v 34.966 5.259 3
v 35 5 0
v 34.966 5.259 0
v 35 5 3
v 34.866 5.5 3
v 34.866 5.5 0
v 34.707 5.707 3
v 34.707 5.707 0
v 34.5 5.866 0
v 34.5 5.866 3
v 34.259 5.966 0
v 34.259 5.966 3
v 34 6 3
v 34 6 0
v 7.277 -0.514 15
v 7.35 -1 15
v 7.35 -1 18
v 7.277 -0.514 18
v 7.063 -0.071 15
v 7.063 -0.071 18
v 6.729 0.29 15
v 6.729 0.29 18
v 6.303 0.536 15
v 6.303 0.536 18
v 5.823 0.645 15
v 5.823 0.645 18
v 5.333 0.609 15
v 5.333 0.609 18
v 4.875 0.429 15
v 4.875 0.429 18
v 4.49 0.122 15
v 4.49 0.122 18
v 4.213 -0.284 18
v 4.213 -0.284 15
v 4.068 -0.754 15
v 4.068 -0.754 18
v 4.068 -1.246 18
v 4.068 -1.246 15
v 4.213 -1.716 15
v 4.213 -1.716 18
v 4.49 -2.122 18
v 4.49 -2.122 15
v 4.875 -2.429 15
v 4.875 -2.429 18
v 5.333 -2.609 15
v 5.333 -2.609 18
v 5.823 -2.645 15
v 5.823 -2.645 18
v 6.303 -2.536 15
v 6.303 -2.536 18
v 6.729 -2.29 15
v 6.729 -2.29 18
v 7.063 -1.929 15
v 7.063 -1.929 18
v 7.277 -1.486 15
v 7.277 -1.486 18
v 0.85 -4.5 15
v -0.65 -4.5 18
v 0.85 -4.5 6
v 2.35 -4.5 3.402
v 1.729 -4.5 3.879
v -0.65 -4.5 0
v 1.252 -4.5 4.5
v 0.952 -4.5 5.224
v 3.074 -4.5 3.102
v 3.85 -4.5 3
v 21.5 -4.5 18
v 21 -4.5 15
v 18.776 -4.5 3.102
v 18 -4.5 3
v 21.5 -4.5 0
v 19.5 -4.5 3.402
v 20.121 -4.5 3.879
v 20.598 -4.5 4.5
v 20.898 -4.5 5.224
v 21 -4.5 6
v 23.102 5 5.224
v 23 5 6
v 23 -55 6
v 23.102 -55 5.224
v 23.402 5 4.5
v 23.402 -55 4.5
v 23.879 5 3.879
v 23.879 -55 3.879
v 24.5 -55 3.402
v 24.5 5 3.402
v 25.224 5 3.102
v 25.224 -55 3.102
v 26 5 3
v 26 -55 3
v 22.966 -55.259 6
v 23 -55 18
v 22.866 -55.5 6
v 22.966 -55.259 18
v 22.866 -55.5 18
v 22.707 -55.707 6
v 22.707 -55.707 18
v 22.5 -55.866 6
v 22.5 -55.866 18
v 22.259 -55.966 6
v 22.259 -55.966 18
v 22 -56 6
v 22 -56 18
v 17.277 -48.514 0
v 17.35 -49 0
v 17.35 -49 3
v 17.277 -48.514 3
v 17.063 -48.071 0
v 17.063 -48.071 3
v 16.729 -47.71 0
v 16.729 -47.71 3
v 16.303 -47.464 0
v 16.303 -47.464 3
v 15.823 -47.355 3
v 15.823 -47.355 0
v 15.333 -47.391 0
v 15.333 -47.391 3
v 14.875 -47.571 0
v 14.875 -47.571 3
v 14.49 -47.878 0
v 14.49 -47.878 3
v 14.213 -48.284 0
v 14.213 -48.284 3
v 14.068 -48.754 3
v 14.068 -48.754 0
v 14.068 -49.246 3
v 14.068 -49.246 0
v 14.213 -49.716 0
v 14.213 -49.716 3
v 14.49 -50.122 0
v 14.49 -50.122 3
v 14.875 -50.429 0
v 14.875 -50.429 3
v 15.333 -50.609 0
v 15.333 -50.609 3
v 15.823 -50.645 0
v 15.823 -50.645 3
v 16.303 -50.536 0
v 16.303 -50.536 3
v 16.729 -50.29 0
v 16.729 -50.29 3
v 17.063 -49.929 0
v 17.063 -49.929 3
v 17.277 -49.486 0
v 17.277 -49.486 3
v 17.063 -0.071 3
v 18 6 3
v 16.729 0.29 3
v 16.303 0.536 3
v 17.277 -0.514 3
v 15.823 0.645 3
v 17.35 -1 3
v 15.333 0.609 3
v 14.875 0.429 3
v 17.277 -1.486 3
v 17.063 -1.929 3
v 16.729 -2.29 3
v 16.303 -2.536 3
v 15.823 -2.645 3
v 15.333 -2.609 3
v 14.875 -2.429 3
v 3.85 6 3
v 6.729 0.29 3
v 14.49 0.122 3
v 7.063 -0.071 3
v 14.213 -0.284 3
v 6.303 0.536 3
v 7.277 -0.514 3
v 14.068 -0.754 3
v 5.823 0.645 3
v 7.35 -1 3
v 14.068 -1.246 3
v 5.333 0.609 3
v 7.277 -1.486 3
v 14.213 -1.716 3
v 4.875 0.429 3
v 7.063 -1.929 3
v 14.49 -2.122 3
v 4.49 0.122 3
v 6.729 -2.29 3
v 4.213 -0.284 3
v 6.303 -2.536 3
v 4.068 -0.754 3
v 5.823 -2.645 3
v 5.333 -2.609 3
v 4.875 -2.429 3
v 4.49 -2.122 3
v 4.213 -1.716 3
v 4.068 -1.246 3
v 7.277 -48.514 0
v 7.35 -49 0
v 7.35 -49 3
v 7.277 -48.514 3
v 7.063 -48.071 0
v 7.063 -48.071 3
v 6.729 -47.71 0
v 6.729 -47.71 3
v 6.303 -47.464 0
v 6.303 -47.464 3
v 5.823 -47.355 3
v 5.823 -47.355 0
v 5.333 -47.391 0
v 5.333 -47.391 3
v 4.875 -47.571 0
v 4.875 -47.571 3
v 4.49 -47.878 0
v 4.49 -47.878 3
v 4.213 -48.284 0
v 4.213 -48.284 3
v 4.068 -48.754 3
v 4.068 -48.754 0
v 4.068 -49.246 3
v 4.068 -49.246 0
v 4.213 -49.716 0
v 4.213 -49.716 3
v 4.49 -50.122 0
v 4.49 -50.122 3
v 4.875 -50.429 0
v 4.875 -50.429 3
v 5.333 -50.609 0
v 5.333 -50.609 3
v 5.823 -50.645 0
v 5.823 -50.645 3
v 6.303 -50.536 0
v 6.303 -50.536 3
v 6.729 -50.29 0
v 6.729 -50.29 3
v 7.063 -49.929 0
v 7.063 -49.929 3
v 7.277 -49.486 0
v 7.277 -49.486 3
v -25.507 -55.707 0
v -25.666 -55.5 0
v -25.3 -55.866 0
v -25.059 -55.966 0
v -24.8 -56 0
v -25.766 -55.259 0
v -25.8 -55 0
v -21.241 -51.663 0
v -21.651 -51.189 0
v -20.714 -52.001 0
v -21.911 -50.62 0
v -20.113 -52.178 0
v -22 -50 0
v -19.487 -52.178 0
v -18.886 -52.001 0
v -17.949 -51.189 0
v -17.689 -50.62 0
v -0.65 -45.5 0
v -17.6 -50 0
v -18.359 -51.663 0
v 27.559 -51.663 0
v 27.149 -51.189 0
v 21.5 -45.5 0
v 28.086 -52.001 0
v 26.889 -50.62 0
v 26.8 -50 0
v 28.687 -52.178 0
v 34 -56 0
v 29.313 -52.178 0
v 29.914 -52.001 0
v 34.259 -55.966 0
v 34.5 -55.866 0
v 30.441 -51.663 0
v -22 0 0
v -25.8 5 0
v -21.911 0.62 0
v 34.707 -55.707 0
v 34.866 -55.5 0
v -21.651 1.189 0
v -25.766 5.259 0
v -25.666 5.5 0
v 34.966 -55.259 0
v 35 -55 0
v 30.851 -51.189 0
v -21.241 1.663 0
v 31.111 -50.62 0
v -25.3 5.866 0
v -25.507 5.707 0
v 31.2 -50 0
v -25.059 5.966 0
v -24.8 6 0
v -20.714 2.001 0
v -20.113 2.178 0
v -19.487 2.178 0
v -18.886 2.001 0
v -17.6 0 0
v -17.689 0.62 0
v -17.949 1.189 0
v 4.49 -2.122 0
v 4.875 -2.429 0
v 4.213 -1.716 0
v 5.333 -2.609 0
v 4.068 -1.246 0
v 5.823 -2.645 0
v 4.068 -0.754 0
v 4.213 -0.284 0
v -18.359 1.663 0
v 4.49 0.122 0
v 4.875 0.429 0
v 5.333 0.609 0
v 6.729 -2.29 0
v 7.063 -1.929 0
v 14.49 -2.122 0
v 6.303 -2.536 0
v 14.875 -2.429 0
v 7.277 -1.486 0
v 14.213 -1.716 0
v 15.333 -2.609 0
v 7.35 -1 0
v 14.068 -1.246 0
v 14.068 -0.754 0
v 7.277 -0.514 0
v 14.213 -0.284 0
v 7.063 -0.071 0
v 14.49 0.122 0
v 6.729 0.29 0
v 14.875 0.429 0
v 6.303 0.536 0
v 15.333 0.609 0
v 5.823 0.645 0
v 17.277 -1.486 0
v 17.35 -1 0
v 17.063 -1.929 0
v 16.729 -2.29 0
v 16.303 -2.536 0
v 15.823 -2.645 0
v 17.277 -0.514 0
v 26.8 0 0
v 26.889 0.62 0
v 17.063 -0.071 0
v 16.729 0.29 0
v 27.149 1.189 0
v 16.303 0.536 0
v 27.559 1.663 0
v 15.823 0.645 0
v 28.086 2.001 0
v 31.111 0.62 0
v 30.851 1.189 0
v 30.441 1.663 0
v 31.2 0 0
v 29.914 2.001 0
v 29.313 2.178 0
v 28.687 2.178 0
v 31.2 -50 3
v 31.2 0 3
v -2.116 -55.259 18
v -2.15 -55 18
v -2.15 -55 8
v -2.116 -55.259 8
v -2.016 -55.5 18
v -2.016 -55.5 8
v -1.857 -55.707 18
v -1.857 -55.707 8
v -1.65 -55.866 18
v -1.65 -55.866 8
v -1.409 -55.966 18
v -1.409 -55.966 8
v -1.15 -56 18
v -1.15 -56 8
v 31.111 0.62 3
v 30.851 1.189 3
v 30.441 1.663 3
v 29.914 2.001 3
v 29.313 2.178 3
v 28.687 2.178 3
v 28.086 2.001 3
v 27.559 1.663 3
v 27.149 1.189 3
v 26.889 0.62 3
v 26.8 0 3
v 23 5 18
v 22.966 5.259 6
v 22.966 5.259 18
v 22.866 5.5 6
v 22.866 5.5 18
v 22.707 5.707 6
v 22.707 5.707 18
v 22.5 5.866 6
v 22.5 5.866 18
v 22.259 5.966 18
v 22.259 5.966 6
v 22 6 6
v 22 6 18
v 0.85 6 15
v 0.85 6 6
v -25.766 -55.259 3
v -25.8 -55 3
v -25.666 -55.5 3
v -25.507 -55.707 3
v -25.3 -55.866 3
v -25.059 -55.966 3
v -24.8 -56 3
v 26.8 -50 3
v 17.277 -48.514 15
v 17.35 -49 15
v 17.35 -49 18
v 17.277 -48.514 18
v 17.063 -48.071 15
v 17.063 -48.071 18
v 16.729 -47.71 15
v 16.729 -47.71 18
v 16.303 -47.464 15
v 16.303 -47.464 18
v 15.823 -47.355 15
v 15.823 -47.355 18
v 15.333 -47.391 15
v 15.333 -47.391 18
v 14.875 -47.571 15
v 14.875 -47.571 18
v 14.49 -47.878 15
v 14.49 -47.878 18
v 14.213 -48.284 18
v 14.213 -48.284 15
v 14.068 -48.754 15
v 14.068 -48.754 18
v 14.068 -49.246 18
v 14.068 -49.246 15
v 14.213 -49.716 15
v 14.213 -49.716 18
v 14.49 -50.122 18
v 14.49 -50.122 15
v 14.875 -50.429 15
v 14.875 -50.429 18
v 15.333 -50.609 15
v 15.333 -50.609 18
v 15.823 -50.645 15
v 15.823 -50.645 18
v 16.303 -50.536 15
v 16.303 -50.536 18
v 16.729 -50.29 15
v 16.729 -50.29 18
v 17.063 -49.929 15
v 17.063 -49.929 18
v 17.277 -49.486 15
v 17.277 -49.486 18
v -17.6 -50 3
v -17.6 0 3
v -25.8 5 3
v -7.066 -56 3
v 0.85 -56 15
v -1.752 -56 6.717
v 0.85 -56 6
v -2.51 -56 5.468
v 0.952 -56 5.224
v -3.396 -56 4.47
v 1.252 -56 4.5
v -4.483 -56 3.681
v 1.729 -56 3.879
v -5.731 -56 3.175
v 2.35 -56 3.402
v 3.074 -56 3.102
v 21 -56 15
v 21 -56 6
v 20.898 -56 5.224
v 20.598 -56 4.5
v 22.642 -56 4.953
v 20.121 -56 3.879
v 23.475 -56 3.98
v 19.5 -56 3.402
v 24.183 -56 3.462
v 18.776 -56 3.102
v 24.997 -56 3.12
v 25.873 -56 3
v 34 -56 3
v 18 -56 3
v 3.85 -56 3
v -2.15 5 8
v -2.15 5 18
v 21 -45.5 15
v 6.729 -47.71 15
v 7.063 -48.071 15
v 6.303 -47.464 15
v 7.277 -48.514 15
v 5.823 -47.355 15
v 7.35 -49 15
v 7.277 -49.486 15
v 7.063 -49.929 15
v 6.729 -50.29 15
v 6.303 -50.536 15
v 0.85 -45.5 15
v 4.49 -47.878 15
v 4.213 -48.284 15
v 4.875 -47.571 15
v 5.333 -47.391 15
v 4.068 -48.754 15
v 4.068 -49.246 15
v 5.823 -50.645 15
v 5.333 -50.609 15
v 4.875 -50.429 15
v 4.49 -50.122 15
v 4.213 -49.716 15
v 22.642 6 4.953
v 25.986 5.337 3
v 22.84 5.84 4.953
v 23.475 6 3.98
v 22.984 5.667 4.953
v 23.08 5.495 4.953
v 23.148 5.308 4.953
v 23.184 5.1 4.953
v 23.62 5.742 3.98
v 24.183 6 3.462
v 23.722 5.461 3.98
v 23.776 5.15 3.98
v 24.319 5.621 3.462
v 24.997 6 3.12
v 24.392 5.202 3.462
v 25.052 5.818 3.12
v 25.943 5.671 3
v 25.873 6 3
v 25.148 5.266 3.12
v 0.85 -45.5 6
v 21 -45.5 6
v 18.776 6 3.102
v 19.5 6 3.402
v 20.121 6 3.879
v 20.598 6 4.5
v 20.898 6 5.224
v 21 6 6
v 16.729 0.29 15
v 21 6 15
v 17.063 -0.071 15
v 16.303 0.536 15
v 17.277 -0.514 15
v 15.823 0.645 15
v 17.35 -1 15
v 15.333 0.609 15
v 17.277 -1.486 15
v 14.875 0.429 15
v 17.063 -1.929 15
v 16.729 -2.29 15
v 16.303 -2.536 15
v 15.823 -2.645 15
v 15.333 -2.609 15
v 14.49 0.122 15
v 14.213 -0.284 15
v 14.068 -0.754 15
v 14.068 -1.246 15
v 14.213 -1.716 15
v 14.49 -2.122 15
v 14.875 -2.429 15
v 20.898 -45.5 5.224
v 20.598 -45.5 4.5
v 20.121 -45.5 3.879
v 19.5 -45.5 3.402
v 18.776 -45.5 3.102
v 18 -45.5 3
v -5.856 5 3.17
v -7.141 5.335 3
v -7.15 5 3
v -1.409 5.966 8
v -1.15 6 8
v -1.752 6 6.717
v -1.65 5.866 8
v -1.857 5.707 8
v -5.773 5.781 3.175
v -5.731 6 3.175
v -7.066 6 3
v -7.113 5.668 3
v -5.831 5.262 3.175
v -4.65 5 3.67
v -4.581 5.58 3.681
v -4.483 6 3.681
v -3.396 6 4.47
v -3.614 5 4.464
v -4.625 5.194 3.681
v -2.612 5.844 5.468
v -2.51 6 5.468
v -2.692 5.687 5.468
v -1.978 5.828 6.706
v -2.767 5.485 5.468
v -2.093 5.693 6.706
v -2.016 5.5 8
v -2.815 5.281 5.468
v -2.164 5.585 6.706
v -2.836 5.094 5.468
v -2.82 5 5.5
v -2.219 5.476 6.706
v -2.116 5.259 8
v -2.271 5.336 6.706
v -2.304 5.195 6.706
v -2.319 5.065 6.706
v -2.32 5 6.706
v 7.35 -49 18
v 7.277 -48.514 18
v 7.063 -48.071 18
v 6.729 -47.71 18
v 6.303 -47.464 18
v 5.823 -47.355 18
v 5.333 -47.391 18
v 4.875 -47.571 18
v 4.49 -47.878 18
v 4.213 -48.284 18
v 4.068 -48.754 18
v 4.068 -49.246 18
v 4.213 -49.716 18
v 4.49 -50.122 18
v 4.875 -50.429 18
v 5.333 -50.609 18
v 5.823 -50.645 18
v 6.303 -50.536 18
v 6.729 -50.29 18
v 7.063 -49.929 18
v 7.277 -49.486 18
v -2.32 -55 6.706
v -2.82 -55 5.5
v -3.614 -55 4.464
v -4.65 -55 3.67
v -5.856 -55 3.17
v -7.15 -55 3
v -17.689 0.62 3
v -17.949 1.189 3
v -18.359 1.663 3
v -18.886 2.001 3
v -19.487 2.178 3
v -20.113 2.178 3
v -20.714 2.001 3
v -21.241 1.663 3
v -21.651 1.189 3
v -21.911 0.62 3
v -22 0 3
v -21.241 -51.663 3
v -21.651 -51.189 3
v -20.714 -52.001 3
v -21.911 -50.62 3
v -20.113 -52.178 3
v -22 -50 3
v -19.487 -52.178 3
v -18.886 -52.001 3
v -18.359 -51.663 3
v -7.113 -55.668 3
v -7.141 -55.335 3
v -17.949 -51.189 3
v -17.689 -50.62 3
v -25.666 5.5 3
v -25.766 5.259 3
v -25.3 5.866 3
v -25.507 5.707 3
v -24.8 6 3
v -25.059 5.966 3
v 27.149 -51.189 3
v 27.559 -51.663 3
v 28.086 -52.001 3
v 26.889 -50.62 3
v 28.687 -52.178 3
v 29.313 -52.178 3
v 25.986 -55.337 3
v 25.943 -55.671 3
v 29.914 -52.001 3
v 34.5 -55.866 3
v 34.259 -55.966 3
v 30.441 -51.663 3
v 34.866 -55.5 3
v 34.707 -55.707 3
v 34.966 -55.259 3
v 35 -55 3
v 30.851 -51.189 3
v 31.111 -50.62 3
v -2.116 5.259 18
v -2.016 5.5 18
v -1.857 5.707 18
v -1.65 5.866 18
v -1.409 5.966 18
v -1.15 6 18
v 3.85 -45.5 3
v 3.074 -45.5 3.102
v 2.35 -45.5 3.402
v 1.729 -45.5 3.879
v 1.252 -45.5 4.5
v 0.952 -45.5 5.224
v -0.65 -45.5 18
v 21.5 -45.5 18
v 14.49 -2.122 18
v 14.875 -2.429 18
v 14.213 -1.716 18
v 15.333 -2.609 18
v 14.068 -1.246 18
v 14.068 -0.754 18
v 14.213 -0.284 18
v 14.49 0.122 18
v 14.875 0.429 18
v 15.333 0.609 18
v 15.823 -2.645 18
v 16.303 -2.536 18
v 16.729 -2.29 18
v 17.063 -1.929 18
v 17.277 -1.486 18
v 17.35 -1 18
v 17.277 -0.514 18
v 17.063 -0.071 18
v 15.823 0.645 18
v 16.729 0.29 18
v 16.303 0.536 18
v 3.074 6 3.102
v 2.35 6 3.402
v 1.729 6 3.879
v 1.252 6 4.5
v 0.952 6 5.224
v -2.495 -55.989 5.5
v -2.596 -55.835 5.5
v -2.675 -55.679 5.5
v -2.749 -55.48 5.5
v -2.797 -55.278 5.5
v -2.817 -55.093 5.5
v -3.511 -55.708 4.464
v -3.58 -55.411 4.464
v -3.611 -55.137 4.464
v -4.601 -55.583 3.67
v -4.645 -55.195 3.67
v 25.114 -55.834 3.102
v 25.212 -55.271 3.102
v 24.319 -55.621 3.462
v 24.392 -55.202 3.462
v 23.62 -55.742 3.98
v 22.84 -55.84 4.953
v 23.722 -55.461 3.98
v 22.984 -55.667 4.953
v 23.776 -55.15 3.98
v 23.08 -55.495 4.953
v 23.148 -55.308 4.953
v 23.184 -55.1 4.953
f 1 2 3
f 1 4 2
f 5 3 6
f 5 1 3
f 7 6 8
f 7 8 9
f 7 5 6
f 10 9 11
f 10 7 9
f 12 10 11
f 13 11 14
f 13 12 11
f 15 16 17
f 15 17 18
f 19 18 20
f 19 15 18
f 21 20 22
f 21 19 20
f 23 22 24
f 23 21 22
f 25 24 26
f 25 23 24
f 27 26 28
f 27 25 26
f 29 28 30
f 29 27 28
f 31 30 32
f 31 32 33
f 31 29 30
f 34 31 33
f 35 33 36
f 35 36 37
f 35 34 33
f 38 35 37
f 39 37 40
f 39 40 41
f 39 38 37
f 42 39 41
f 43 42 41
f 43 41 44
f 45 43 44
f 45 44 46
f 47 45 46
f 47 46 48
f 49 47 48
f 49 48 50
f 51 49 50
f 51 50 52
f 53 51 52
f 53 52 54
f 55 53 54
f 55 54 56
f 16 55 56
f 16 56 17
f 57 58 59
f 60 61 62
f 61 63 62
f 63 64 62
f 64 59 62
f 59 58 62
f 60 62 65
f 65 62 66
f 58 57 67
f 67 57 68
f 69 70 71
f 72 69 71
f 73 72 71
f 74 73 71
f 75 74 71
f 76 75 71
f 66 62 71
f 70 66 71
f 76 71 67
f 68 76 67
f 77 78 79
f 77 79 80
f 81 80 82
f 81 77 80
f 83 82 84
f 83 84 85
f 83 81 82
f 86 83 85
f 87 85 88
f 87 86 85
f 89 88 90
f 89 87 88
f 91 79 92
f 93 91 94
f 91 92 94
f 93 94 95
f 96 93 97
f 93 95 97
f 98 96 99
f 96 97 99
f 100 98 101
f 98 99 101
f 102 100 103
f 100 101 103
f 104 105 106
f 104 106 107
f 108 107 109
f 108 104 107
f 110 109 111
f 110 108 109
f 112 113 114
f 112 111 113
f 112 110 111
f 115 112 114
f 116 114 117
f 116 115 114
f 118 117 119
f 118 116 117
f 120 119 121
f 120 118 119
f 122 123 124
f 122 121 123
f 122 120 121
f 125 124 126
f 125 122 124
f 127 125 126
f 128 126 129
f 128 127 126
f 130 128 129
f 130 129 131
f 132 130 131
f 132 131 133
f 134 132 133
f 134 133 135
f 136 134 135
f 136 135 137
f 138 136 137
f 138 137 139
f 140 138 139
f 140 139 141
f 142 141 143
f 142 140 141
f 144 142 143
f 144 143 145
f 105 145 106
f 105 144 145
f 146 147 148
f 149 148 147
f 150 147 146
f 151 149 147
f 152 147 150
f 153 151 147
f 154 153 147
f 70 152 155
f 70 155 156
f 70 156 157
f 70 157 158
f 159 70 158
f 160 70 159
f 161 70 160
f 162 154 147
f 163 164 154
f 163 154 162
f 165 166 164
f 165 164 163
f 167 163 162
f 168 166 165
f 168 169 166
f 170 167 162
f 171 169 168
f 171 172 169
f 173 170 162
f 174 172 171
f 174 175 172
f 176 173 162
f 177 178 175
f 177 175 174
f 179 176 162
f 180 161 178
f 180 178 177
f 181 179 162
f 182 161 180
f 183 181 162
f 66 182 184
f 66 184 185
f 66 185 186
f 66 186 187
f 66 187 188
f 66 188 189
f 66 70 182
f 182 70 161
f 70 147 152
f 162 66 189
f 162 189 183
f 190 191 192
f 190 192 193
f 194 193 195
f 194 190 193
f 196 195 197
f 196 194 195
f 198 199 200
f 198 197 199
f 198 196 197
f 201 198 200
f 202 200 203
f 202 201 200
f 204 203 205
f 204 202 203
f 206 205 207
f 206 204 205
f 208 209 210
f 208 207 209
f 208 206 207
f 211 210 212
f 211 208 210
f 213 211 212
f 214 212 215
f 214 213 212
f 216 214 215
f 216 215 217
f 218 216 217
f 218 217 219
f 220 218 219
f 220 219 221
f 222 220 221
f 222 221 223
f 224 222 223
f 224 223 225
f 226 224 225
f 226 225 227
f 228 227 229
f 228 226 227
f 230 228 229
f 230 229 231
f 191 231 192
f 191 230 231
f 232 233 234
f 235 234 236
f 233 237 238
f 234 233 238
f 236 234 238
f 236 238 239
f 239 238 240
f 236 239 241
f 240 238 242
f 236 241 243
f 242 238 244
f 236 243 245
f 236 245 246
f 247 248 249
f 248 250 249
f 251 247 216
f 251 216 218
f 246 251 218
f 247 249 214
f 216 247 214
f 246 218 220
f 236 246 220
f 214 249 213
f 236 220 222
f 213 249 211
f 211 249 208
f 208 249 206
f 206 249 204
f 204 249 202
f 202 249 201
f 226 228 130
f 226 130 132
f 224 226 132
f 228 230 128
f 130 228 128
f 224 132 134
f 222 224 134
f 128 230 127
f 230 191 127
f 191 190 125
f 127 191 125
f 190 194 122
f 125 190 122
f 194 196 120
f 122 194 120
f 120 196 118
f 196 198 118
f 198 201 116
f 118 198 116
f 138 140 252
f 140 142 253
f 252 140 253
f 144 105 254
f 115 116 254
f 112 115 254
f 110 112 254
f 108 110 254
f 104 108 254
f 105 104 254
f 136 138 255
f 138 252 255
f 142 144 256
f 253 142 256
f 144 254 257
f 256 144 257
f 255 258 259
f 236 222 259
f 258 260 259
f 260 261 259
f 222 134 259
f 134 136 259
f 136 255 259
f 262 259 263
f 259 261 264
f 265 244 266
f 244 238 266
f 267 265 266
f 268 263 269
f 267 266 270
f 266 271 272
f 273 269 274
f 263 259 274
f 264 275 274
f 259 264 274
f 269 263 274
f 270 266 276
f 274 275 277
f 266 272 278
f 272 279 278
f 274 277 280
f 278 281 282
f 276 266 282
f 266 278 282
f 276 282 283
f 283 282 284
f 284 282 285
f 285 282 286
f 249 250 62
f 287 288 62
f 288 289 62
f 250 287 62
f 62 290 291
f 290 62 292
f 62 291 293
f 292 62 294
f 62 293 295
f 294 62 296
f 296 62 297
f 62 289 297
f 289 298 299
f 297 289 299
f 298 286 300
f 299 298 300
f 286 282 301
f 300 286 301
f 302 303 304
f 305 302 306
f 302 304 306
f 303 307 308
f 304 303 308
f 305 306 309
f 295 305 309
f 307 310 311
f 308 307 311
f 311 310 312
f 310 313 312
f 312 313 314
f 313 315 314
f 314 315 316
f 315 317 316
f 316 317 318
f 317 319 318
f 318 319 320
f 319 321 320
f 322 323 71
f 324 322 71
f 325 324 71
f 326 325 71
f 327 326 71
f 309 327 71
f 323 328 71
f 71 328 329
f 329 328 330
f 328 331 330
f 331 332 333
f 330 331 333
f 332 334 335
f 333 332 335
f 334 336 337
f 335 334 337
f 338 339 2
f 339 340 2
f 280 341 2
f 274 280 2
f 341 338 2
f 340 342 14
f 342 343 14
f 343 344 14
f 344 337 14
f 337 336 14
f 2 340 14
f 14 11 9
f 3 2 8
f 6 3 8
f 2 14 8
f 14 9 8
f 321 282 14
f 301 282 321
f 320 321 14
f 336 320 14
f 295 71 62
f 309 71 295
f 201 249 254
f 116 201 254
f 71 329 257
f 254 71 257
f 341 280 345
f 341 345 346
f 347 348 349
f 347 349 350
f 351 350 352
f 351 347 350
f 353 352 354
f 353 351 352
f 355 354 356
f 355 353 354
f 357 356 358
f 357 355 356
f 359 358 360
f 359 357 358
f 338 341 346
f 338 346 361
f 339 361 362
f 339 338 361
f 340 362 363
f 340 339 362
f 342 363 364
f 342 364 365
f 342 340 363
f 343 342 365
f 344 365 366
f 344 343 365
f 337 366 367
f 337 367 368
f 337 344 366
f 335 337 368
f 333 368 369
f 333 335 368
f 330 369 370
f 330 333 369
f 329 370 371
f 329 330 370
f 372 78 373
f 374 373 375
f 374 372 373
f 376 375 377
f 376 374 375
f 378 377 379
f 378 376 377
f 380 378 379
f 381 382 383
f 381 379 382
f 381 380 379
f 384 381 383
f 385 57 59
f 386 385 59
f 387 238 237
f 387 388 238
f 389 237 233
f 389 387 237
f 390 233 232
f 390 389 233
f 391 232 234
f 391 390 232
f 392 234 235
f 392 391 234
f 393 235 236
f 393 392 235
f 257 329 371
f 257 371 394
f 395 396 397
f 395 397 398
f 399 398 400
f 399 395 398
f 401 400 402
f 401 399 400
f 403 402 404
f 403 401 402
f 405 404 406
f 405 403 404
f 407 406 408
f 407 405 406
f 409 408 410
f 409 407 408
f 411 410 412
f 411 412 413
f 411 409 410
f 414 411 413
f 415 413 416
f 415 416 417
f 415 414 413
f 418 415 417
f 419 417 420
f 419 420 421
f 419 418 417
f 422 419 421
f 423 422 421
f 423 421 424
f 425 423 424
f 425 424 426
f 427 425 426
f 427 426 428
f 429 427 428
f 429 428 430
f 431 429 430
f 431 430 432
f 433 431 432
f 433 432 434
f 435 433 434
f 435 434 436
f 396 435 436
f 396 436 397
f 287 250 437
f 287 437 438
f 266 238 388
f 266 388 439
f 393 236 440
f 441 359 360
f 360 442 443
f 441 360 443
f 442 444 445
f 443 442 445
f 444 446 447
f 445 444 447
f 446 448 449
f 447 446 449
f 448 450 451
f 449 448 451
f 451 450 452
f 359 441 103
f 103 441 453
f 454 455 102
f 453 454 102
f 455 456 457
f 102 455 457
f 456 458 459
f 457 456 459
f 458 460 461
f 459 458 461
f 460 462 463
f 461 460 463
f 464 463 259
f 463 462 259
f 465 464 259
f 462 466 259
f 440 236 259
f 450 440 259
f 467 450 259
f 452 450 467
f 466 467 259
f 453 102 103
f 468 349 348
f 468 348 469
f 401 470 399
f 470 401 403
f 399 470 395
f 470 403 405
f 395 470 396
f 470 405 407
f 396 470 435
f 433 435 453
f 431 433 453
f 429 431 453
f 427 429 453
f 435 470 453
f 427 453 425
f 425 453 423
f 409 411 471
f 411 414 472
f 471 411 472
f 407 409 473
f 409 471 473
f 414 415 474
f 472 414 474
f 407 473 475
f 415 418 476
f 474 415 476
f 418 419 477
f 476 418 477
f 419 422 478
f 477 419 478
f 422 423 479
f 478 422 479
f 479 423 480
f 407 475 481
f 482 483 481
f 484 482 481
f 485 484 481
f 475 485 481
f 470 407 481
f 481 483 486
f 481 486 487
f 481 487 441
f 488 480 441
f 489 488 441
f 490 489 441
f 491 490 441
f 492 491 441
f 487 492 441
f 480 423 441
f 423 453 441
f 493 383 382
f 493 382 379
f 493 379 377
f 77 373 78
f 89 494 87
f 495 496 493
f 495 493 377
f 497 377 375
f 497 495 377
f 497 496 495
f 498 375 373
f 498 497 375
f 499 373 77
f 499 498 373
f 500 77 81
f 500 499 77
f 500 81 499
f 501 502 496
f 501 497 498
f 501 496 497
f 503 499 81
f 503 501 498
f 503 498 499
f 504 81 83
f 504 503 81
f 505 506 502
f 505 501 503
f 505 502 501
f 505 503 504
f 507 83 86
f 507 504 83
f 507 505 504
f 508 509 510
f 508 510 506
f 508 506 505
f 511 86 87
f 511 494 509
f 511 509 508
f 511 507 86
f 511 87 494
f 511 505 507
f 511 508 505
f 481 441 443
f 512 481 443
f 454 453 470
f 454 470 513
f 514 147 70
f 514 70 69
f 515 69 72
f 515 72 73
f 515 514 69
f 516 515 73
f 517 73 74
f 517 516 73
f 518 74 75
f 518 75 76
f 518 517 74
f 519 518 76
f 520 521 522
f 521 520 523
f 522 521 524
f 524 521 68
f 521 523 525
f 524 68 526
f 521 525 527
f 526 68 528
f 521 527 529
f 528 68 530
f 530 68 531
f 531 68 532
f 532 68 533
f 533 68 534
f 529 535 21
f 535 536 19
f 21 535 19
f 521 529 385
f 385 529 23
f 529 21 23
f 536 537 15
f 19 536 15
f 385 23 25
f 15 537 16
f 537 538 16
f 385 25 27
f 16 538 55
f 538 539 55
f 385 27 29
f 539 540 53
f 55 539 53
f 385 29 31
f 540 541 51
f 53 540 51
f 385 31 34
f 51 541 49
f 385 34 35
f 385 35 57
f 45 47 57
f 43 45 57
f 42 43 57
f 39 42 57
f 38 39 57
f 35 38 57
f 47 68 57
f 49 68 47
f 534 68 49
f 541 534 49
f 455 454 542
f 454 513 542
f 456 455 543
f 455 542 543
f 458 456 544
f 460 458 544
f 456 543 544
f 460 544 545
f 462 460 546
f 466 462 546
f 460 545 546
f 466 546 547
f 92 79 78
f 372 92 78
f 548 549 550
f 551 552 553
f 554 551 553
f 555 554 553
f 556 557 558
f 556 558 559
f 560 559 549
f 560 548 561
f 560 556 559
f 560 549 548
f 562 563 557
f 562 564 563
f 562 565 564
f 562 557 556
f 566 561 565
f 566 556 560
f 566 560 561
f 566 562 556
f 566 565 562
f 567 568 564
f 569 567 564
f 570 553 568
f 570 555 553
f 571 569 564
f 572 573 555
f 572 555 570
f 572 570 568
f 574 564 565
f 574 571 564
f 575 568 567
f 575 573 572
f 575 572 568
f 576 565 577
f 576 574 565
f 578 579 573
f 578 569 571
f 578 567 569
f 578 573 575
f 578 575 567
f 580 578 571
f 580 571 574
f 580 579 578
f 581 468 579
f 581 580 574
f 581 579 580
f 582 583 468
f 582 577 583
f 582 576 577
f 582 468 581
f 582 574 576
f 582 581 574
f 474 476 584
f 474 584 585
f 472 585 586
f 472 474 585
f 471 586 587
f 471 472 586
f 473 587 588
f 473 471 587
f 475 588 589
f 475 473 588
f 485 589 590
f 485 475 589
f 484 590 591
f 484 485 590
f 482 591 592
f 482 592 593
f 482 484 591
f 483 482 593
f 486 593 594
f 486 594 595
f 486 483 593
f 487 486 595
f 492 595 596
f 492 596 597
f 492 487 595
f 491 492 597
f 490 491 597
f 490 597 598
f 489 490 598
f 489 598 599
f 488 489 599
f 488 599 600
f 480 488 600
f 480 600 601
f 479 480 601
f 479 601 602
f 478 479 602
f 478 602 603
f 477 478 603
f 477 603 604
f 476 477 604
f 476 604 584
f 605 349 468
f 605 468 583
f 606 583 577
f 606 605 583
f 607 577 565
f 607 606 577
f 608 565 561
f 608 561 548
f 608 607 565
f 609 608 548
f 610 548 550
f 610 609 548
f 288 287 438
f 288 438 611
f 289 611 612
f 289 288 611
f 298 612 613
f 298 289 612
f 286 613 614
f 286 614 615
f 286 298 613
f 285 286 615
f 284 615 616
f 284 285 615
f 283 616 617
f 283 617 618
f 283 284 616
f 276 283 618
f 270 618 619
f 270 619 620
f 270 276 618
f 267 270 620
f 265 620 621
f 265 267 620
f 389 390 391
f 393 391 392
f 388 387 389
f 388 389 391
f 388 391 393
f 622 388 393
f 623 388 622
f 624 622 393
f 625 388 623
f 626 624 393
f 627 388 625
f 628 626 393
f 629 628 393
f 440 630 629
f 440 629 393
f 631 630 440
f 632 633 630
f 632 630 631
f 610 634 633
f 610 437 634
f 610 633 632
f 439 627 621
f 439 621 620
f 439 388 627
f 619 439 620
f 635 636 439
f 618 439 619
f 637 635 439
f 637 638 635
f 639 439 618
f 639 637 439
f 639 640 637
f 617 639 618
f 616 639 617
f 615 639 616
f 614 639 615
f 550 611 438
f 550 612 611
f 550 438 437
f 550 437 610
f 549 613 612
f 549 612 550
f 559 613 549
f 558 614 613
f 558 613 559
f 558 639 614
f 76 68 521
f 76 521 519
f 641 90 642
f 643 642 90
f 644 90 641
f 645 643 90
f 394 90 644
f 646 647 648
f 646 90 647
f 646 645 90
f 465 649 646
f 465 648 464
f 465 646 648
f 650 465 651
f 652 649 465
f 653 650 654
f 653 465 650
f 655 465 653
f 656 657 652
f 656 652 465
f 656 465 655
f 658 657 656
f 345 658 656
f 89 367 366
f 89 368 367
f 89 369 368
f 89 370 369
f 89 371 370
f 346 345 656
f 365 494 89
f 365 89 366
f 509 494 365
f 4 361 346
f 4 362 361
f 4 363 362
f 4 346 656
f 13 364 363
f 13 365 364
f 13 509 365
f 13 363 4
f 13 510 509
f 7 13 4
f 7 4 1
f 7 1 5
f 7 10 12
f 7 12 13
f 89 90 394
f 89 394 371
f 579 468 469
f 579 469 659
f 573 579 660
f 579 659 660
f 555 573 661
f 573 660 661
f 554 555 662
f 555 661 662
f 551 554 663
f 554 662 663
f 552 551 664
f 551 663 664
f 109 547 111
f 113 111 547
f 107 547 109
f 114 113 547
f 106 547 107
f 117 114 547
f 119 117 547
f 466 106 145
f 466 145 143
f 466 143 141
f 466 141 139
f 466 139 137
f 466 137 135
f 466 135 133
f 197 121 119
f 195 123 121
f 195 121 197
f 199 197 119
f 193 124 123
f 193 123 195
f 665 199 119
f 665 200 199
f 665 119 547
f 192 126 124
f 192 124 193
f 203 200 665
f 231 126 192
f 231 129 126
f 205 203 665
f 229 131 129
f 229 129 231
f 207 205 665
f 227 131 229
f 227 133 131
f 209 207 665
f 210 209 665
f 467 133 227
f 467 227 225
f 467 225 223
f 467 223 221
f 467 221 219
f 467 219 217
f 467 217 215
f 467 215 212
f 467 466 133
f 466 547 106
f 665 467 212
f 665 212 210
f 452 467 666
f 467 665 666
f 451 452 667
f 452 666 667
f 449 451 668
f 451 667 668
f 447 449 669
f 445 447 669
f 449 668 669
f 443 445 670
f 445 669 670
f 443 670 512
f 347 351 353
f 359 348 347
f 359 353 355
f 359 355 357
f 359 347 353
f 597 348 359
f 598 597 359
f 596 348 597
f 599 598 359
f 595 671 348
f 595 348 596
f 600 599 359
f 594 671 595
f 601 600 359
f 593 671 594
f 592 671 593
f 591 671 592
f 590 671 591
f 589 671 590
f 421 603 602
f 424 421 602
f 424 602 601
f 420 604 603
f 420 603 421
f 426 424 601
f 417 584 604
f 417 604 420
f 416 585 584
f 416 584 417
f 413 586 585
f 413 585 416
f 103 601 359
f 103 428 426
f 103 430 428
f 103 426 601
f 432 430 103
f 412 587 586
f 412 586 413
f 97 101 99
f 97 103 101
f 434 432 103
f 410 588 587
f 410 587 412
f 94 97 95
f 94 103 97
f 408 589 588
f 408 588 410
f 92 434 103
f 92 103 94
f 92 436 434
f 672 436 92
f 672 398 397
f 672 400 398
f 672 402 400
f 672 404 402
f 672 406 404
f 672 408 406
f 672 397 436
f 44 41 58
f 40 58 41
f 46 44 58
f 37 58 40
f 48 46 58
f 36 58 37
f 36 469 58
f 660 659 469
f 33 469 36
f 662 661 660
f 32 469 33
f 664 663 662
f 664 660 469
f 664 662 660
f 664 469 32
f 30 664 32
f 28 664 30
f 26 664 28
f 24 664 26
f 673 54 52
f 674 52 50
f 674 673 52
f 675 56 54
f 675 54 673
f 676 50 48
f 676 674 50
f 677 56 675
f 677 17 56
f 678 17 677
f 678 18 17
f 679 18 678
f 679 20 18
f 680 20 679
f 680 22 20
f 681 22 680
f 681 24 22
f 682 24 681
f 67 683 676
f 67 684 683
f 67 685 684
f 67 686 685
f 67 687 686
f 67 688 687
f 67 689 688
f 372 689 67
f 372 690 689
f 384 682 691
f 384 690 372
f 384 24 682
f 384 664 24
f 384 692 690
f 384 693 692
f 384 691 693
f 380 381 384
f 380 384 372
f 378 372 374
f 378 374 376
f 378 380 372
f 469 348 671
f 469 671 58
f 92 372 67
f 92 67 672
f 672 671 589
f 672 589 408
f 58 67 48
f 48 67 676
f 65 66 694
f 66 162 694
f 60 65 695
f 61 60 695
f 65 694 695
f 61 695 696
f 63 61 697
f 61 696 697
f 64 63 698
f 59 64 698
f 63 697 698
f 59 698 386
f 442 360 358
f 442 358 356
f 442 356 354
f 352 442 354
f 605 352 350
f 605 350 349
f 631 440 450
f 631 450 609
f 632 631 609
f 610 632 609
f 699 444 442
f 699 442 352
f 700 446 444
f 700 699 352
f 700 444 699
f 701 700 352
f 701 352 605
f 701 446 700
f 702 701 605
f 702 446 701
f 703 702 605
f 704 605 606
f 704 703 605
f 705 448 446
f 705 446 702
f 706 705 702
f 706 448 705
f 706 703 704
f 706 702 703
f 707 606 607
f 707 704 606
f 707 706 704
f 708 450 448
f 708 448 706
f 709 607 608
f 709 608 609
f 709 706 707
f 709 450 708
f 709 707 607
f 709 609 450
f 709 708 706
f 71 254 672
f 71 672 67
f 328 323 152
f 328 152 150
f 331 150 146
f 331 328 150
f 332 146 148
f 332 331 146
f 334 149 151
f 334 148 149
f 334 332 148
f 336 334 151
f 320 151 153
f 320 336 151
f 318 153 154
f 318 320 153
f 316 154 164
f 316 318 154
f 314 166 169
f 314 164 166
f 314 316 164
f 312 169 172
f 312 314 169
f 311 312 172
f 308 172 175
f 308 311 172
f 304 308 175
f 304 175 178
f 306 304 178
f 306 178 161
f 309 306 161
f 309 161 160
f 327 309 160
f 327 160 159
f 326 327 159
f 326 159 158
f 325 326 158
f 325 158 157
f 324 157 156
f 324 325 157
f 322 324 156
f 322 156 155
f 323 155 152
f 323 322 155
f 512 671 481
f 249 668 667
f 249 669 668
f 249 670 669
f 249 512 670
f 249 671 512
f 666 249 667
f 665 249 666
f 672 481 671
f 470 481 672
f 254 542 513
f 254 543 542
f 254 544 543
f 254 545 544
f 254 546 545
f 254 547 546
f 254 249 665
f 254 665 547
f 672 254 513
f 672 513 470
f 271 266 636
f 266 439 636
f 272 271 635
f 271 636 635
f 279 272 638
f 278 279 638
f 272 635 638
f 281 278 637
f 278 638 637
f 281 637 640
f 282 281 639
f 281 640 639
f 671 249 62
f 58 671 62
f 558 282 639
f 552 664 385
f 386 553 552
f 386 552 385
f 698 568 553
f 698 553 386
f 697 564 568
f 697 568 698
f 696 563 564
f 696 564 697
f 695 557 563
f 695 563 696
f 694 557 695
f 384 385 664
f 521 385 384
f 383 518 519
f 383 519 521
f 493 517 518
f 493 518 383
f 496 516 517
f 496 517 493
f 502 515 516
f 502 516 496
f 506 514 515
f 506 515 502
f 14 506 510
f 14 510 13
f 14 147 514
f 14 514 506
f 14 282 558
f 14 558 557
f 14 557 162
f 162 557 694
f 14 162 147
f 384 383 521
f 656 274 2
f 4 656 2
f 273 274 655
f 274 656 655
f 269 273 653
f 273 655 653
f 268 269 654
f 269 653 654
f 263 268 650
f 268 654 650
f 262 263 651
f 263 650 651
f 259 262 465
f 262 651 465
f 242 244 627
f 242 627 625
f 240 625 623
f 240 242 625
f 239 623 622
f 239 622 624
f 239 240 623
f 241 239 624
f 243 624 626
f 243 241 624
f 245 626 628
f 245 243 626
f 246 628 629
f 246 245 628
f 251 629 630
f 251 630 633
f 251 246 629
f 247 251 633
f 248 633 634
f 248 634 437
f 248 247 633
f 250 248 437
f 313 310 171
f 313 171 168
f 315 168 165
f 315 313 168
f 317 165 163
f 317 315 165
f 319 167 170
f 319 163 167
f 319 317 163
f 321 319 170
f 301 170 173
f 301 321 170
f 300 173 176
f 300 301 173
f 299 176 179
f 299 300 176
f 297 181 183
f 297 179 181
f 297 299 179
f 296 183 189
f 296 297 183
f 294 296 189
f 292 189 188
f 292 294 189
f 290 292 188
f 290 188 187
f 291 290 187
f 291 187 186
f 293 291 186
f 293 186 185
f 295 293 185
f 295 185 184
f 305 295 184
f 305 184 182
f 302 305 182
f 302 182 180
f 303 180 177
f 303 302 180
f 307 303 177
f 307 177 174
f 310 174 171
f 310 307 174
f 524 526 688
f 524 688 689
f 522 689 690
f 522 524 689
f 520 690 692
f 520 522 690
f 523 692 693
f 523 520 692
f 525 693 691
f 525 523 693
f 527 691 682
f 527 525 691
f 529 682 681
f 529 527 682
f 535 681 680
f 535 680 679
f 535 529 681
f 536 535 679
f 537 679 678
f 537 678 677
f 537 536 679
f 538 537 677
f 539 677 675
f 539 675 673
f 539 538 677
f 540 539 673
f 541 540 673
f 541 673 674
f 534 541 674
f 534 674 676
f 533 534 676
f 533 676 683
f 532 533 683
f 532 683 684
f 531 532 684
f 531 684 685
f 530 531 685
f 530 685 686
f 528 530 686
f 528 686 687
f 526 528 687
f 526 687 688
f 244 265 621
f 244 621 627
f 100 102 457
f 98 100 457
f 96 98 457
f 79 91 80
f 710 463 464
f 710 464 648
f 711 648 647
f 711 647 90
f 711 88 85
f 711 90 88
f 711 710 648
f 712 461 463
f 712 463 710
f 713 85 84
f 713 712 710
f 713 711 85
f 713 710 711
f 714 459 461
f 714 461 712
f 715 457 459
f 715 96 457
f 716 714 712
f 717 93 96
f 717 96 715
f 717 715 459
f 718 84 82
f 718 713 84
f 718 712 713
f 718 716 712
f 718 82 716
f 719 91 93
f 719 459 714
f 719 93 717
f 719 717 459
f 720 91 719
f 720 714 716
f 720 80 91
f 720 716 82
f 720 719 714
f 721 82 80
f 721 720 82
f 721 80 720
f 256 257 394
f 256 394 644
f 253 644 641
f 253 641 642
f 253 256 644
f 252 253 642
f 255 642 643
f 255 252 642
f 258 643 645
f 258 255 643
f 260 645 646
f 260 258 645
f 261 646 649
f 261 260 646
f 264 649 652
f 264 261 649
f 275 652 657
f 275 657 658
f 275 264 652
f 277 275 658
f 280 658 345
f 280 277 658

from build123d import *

# Parameters (mm, degrees)
SKETCH_1_W          = 60.8
SKETCH_1_H          = 62
EXTRUDE_1_DEPTH     = 3
SKETCH_2_W          = 25.15
SKETCH_2_H          = 62
SKETCH_2_R          = 1.65
EXTRUDE_2_DEPTH     = 15
CUT_EXTRUDE_START   = -45
SKETCH_4_R          = 1.65
SKETCH_4_W          = 22.15
SKETCH_4_H          = 41
CUT_EXTRUDE_4_DEPTH = 45
FILLET_1_R          = 1
FILLET_2_R          = 5
SKETCH_5_W          = 20.15
SKETCH_5_H          = 12
CUT_EXTRUDE_5_DEPTH = 70
FILLET_3_R          = 3
FILLET_4_R          = 3


with BuildPart() as part:
    # 草图1 → 凸台-拉伸1 (new body)
    with BuildSketch(Plane.XY):
        with Locations((4.6, -25)):
            Rectangle(SKETCH_1_W, SKETCH_1_H)
        with BuildLine():
            Line((26.8, 0), (26.8, -50))
            ThreePointArc((26.8, -50), (29, -52.2), (31.2, -50))
            Line((31.2, -50), (31.2, 0))
            ThreePointArc((31.2, 0), (29, 2.2), (26.8, 0))
        make_face(mode=Mode.SUBTRACT)
        with BuildLine():
            Line((-22, 0), (-22, -50))
            ThreePointArc((-22, -50), (-19.8, -52.2), (-17.6, -50))
            Line((-17.6, -50), (-17.6, 0))
            ThreePointArc((-17.6, 0), (-19.8, 2.2), (-22, 0))
        make_face(mode=Mode.SUBTRACT)
    extrude(amount=EXTRUDE_1_DEPTH)

    # 草图2 → 凸台-拉伸2 (add)
    with BuildSketch(Plane.XY.offset(3)):
        with Locations((10.425, -25)):
            Rectangle(SKETCH_2_W, SKETCH_2_H)
        with Locations((5.7, -1)):
            Circle(SKETCH_2_R, mode=Mode.SUBTRACT)
        with Locations((15.7, -1)):
            Circle(SKETCH_2_R, mode=Mode.SUBTRACT)
        with Locations((15.7, -49)):
            Circle(SKETCH_2_R, mode=Mode.SUBTRACT)
        with Locations((5.7, -49)):
            Circle(SKETCH_2_R, mode=Mode.SUBTRACT)
    extrude(amount=EXTRUDE_2_DEPTH)

    # 草图4 → 切除-拉伸4 (cut)
    with BuildSketch(Plane.XY.offset(18).offset(CUT_EXTRUDE_START)):
        with Locations((5.7, -1)):
            Circle(SKETCH_4_R)
        with Locations((5.7, -49)):
            Circle(SKETCH_4_R)
        with Locations((15.7, -49)):
            Circle(SKETCH_4_R)
        with Locations((15.7, -1)):
            Circle(SKETCH_4_R)
        with Locations((10.425, -25)):
            Rectangle(SKETCH_4_W, SKETCH_4_H)
    extrude(amount=CUT_EXTRUDE_4_DEPTH, mode=Mode.SUBTRACT)

    # 圆角1
    fillet_1_edges = [part.edges().sort_by_distance(p)[0] for p in [
        (-2.15, 6, 10.5),
        (-2.15, -56, 10.5),
        (23, -56, 10.5),
        (23, 6, 10.5),
        (-25.8, 6, 1.5),
        (35, 6, 1.5),
        (35, -56, 1.5),
        (-25.8, -56, 1.5),
    ]]
    fillet(fillet_1_edges, radius=FILLET_1_R)

    # 圆角2
    # the kernel refuses this fillet: 5 mm, written as the material it adds along each edge
    with BuildSketch(Plane(origin=(-2.15, -55, 3), x_dir=(0, 0, 1), z_dir=(0, 1, 0))) as fillet_2_piece_1:
        with BuildLine():
            CenterArc((FILLET_2_R, -FILLET_2_R), FILLET_2_R, 90, 90)
            Line((0, -FILLET_2_R), (0, 0))
            Line((0, 0), (FILLET_2_R, 0))
        make_face()
    extrude(amount=60)
    with BuildSketch(Plane(origin=(-1.15, 5, 3), x_dir=(-0.9999802608561372, -0.00628314396555929, 0), z_dir=(-0.00628314396555929, 0.9999802608561372, 0))) as fillet_2_piece_2_section:
        with BuildLine():
            CenterArc((-1 - FILLET_2_R, FILLET_2_R), FILLET_2_R, 270, 90)
            Line((-1 - FILLET_2_R, 0), (-1, 0))
            Line((-1, 0), (-1, FILLET_2_R))
        make_face()
    fillet_2_piece_2 = revolve(axis=Axis((-1.15, 5, 3), (0, 0, 1)), revolution_arc=359.64, mode=Mode.PRIVATE)
    fillet_2_piece_2 = split(fillet_2_piece_2, bisect_by=Plane(origin=(-1.917475006, 6, 5.017645517), z_dir=(0, -1, 0)), keep=Keep.TOP, mode=Mode.PRIVATE)
    add(fillet_2_piece_2)
    with BuildSketch(Plane(origin=(-1.15, -55, 3), x_dir=(-0.9999802608561372, 0.006283143965561067, 0), z_dir=(-0.006283143965561067, -0.9999802608561372, 0))) as fillet_2_piece_3_section:
        with BuildLine():
            CenterArc((-1 - FILLET_2_R, -FILLET_2_R), FILLET_2_R, 0, 90)
            Line((-1 - FILLET_2_R, 0), (-1, 0))
            Line((-1, 0), (-1, -FILLET_2_R))
        make_face()
    fillet_2_piece_3 = revolve(axis=Axis((-1.15, -55, 3), (0, 0, -1)), revolution_arc=359.64, mode=Mode.PRIVATE)
    fillet_2_piece_3 = split(fillet_2_piece_3, bisect_by=Plane(origin=(-1.917475041, -56, 5.017645533), z_dir=(0, 1, 0)), keep=Keep.TOP, mode=Mode.PRIVATE)
    add(fillet_2_piece_3)

    # 草图5 → 切除-拉伸5 (cut)
    with BuildSketch(Plane(origin=(0, -56, 0), x_dir=(-1, 0, 0), z_dir=(0, -1, 0))):
        with Locations((-10.925, -9)):
            Rectangle(SKETCH_5_W, SKETCH_5_H)
    extrude(amount=-CUT_EXTRUDE_5_DEPTH, mode=Mode.SUBTRACT)

    # 圆角3
    fillet_3_edges = [part.edges().sort_by_distance(p)[0] for p in [
        (0.85, 0.75, 3),
        (0.85, -50.75, 3),
        (21, 0.75, 3),
        (21, -50.75, 3),
    ]]
    fillet(fillet_3_edges, radius=FILLET_3_R)

    # 圆角4
    # the kernel refuses this fillet: 3 mm, written as the material it adds along each edge
    with BuildSketch(Plane(origin=(23, 5, 3), x_dir=(1, 0, 0), z_dir=(0, -1, 0))) as fillet_4_piece_1:
        with BuildLine():
            CenterArc((FILLET_4_R, FILLET_4_R), FILLET_4_R, 180, 90)
            Line((0, FILLET_4_R), (0, 0))
            Line((0, 0), (FILLET_4_R, 0))
        make_face()
    extrude(amount=60)
    with BuildSketch(Plane(origin=(22, 5, 3), x_dir=(0.9999802608561372, -0.0062831439655584, 0), z_dir=(0.0062831439655584, 0.9999802608561372, 0))) as fillet_4_piece_2_section:
        with BuildLine():
            CenterArc((-1 - FILLET_4_R, -FILLET_4_R), FILLET_4_R, 0, 90)
            Line((-1, -FILLET_4_R), (-1, 0))
            Line((-1, 0), (-1 - FILLET_4_R, 0))
        make_face()
    fillet_4_piece_2 = revolve(axis=Axis((22, 5, 3), (0, 0, -1)), revolution_arc=359.64, mode=Mode.PRIVATE)
    fillet_4_piece_2 = split(fillet_4_piece_2, bisect_by=Plane(origin=(22.764056833, 6, 4.135633633), z_dir=(0, -1, 0)), keep=Keep.TOP, mode=Mode.PRIVATE)
    add(fillet_4_piece_2)
    with BuildSketch(Plane(origin=(22, -55, 3), x_dir=(0.9999802608561372, 0.006283143965561065, 0), z_dir=(0.006283143965561065, -0.9999802608561372, 0))) as fillet_4_piece_3_section:
        with BuildLine():
            CenterArc((-1 - FILLET_4_R, FILLET_4_R), FILLET_4_R, 270, 90)
            Line((-1 - FILLET_4_R, 0), (-1, 0))
            Line((-1, 0), (-1, FILLET_4_R))
        make_face()
    fillet_4_piece_3 = revolve(axis=Axis((22, -55, 3), (0, 0, 1)), revolution_arc=359.64, mode=Mode.PRIVATE)
    fillet_4_piece_3 = split(fillet_4_piece_3, bisect_by=Plane(origin=(22.76405677, -56, 4.135633616), z_dir=(0, 1, 0)), keep=Keep.TOP, mode=Mode.PRIVATE)
    add(fillet_4_piece_3)


solid = part.part
